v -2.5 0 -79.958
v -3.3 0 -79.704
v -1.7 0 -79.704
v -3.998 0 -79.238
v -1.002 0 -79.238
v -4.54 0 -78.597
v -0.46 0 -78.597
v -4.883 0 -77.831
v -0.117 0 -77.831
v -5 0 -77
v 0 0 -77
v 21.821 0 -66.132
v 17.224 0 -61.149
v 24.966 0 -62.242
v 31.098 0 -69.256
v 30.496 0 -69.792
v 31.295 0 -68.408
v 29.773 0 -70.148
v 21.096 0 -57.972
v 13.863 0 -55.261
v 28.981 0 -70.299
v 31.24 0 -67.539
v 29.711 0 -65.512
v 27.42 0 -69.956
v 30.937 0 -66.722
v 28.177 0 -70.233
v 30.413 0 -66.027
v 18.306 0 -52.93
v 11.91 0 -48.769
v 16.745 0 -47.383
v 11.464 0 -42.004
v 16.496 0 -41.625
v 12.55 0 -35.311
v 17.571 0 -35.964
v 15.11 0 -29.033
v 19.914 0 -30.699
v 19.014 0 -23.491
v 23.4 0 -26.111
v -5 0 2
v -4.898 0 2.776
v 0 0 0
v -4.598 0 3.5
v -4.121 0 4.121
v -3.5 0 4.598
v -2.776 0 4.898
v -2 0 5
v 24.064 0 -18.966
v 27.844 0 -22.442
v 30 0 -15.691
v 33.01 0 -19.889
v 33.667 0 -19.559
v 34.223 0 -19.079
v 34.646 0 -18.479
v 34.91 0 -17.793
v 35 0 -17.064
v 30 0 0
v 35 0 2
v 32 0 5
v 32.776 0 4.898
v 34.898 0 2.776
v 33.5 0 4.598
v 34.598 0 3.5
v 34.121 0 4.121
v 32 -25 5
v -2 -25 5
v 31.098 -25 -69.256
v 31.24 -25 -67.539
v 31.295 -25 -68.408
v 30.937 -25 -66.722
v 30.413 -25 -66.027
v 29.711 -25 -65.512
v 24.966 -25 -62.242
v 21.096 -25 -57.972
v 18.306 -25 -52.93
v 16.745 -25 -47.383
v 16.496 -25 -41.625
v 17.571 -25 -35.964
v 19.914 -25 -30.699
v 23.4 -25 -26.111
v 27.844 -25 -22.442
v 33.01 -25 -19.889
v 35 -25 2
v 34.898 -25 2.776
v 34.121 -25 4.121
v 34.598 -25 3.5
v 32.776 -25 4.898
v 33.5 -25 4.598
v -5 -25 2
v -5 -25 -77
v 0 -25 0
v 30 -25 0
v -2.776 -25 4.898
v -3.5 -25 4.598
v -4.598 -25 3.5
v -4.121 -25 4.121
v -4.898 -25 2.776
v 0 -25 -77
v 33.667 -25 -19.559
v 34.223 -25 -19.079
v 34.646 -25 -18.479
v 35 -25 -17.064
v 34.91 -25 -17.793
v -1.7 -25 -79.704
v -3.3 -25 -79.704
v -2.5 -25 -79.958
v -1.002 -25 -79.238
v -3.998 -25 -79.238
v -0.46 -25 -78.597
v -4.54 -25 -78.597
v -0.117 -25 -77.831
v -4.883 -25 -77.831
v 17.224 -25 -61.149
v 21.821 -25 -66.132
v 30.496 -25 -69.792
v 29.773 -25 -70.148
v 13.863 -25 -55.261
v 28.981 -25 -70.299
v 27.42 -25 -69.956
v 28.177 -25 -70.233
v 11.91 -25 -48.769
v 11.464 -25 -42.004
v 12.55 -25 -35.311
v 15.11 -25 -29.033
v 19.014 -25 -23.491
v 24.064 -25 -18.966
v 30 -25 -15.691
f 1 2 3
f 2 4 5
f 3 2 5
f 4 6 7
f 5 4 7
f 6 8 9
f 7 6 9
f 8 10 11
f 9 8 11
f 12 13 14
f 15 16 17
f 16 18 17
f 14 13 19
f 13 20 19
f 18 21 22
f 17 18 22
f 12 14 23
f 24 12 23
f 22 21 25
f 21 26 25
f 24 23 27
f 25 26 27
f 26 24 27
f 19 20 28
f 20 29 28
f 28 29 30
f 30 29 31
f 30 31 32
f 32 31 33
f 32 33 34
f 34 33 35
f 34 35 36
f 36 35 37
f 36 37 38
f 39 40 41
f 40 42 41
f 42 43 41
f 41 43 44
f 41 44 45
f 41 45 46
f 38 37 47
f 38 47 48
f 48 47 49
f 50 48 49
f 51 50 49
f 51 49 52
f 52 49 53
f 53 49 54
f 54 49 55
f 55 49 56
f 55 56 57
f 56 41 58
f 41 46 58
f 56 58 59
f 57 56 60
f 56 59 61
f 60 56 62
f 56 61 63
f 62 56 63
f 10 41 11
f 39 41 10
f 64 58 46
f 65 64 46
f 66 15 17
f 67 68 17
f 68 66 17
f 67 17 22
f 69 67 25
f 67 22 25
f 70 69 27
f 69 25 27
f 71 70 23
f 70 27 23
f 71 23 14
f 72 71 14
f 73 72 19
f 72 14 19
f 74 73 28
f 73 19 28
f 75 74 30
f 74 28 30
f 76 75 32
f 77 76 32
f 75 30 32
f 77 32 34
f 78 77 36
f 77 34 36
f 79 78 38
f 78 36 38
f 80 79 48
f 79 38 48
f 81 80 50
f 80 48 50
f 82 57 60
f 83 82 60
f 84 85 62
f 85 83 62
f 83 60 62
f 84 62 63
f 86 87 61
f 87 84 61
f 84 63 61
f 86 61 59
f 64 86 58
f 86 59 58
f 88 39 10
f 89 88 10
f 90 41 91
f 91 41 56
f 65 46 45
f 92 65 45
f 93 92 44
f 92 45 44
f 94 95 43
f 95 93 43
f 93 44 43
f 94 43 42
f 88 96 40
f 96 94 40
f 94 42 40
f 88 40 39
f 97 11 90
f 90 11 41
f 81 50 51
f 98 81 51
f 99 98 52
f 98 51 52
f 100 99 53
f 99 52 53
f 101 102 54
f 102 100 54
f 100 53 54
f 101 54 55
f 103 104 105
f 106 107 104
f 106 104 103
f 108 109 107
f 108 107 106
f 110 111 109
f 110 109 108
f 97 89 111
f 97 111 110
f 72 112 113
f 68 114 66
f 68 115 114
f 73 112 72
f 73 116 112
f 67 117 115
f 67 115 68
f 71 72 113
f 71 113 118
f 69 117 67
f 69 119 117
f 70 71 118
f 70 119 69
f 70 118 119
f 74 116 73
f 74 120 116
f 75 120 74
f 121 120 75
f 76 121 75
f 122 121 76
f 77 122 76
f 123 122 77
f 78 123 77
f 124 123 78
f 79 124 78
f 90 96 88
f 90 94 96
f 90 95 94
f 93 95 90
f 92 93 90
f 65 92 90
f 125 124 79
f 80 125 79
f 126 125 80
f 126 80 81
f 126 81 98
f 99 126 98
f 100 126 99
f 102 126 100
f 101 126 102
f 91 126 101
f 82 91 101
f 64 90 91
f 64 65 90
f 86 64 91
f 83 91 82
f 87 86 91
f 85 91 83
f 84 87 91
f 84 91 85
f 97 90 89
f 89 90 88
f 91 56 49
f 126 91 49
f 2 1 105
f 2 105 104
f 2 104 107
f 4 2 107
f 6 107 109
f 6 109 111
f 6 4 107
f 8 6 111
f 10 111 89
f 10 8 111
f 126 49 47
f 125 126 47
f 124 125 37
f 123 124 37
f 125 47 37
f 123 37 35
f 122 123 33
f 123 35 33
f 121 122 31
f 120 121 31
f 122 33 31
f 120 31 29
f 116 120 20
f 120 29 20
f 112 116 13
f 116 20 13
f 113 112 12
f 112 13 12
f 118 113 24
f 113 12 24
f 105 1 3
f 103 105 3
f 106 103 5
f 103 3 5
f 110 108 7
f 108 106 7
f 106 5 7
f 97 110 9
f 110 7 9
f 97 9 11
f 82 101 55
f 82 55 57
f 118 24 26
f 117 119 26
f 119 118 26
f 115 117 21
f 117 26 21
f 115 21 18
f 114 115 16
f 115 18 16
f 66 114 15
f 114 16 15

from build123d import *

# Parameters (mm, degrees)
F1_DEPTH    = 25
F2_T1_DEPTH = 40
F2_T3_DEPTH = 36.0263819839
F2_T5_DEPTH = 41.8333819759
F2_T7_DEPTH = 39.2479422715


# Not quite as in the source:
# - a fillet or chamfer that OpenCascade refuses, or shapes differently, is made with other operations: its cross-section is extruded or revolved along the edge and cut away or added


with BuildPart() as f1:
    # F0 (on Front) → F1 (new body)
    with BuildSketch(Plane.XZ):
        with BuildLine():
            Line((-5, -80), (0, -80))
            Line((0, -80), (0, 0))
            Line((0, 0), (30, 0))
            Line((30, 0), (30, -15.6914651025))
            ThreePointArc((30, -15.6914651025), (11.4304994047, -43.4285104275), (30, -71.1655557525))
            Line((30, -71.1655557525), (32.6106493124, -66.8210358224))
            ThreePointArc((32.6106493124, -66.8210358224), (16.4620002863, -42.1738982265), (35, -19.26968849))
            Line((35, -19.26968849), (35, 5))
            Line((35, 5), (-5, 5))
            Line((-5, 5), (-5, -80))
        make_face()
    extrude(amount=F1_DEPTH)

    # F2: fillet of radius 3 on 7 edges, made by hand

    # F2_s2 → F2_t1 (cut)
    with BuildSketch(Plane.XZ.offset(-7.5)):
        with BuildLine():
            ThreePointArc((35, 2), (34.1213203436, 4.1213203436), (32, 5))
            Line((32, 5), (35, 5))
            Line((35, 5), (35, 2))
        make_face()
        with BuildLine():
            ThreePointArc((-3, -80), (-0.8786796564, -79.1213203436), (0, -77))
            Line((0, -77), (0, -80))
            Line((0, -80), (-3, -80))
        make_face()
        with BuildLine():
            ThreePointArc((-2, -80), (-4.1213203436, -79.1213203436), (-5, -77))
            Line((-5, -77), (-5, -80))
            Line((-5, -80), (-2, -80))
        make_face()
        with BuildLine():
            ThreePointArc((-2, 5), (-4.1213203436, 4.1213203436), (-5, 2))
            Line((-5, 2), (-5, 5))
            Line((-5, 5), (-2, 5))
        make_face()
    extrude(amount=F2_T1_DEPTH, mode=Mode.SUBTRACT)

    # F2_s4 → F2_t3 (cut)
    with BuildSketch(Plane.XZ.offset(-5.513190992)):
        with BuildLine():
            ThreePointArc((33.0104106505, -19.8891369147), (34.4526752691, -18.7919490752), (35, -17.0644120932))
            Line((35, -17.0644120932), (35, -19.26968849))
            ThreePointArc((35, -19.26968849), (33.9987485172, -19.5586742582), (33.0104106505, -19.8891369147))
        make_face()
    extrude(amount=F2_T3_DEPTH, mode=Mode.SUBTRACT)

    # F2_s6 → F2_t5 (cut)
    with BuildSketch(Plane.XZ.offset(-8.416690988)):
        with BuildLine():
            ThreePointArc((30.8765859694, -69.7067825667), (31.1957188728, -67.3587557485), (29.7114248515, -65.5116101106))
            ThreePointArc((29.7114248515, -65.5116101106), (31.1401881693, -66.212484942), (32.6106493124, -66.8210358224))
            Line((32.6106493124, -66.8210358224), (30.8765859694, -69.7067825667))
        make_face()
    extrude(amount=F2_T5_DEPTH, mode=Mode.SUBTRACT)

    # F2_s8 → F2_t7 (cut)
    with BuildSketch(Plane.XZ.offset(-7.1239711357)):
        with BuildLine():
            ThreePointArc((27.4198994503, -69.9559130315), (29.6266357528, -70.1929626749), (31.39240951, -68.8483732652))
            Line((31.39240951, -68.8483732652), (30, -71.1655557525))
            ThreePointArc((30, -71.1655557525), (28.695579184, -70.5913859559), (27.4198994503, -69.9559130315))
        make_face()
    extrude(amount=F2_T7_DEPTH, mode=Mode.SUBTRACT)


solid = f1.part
